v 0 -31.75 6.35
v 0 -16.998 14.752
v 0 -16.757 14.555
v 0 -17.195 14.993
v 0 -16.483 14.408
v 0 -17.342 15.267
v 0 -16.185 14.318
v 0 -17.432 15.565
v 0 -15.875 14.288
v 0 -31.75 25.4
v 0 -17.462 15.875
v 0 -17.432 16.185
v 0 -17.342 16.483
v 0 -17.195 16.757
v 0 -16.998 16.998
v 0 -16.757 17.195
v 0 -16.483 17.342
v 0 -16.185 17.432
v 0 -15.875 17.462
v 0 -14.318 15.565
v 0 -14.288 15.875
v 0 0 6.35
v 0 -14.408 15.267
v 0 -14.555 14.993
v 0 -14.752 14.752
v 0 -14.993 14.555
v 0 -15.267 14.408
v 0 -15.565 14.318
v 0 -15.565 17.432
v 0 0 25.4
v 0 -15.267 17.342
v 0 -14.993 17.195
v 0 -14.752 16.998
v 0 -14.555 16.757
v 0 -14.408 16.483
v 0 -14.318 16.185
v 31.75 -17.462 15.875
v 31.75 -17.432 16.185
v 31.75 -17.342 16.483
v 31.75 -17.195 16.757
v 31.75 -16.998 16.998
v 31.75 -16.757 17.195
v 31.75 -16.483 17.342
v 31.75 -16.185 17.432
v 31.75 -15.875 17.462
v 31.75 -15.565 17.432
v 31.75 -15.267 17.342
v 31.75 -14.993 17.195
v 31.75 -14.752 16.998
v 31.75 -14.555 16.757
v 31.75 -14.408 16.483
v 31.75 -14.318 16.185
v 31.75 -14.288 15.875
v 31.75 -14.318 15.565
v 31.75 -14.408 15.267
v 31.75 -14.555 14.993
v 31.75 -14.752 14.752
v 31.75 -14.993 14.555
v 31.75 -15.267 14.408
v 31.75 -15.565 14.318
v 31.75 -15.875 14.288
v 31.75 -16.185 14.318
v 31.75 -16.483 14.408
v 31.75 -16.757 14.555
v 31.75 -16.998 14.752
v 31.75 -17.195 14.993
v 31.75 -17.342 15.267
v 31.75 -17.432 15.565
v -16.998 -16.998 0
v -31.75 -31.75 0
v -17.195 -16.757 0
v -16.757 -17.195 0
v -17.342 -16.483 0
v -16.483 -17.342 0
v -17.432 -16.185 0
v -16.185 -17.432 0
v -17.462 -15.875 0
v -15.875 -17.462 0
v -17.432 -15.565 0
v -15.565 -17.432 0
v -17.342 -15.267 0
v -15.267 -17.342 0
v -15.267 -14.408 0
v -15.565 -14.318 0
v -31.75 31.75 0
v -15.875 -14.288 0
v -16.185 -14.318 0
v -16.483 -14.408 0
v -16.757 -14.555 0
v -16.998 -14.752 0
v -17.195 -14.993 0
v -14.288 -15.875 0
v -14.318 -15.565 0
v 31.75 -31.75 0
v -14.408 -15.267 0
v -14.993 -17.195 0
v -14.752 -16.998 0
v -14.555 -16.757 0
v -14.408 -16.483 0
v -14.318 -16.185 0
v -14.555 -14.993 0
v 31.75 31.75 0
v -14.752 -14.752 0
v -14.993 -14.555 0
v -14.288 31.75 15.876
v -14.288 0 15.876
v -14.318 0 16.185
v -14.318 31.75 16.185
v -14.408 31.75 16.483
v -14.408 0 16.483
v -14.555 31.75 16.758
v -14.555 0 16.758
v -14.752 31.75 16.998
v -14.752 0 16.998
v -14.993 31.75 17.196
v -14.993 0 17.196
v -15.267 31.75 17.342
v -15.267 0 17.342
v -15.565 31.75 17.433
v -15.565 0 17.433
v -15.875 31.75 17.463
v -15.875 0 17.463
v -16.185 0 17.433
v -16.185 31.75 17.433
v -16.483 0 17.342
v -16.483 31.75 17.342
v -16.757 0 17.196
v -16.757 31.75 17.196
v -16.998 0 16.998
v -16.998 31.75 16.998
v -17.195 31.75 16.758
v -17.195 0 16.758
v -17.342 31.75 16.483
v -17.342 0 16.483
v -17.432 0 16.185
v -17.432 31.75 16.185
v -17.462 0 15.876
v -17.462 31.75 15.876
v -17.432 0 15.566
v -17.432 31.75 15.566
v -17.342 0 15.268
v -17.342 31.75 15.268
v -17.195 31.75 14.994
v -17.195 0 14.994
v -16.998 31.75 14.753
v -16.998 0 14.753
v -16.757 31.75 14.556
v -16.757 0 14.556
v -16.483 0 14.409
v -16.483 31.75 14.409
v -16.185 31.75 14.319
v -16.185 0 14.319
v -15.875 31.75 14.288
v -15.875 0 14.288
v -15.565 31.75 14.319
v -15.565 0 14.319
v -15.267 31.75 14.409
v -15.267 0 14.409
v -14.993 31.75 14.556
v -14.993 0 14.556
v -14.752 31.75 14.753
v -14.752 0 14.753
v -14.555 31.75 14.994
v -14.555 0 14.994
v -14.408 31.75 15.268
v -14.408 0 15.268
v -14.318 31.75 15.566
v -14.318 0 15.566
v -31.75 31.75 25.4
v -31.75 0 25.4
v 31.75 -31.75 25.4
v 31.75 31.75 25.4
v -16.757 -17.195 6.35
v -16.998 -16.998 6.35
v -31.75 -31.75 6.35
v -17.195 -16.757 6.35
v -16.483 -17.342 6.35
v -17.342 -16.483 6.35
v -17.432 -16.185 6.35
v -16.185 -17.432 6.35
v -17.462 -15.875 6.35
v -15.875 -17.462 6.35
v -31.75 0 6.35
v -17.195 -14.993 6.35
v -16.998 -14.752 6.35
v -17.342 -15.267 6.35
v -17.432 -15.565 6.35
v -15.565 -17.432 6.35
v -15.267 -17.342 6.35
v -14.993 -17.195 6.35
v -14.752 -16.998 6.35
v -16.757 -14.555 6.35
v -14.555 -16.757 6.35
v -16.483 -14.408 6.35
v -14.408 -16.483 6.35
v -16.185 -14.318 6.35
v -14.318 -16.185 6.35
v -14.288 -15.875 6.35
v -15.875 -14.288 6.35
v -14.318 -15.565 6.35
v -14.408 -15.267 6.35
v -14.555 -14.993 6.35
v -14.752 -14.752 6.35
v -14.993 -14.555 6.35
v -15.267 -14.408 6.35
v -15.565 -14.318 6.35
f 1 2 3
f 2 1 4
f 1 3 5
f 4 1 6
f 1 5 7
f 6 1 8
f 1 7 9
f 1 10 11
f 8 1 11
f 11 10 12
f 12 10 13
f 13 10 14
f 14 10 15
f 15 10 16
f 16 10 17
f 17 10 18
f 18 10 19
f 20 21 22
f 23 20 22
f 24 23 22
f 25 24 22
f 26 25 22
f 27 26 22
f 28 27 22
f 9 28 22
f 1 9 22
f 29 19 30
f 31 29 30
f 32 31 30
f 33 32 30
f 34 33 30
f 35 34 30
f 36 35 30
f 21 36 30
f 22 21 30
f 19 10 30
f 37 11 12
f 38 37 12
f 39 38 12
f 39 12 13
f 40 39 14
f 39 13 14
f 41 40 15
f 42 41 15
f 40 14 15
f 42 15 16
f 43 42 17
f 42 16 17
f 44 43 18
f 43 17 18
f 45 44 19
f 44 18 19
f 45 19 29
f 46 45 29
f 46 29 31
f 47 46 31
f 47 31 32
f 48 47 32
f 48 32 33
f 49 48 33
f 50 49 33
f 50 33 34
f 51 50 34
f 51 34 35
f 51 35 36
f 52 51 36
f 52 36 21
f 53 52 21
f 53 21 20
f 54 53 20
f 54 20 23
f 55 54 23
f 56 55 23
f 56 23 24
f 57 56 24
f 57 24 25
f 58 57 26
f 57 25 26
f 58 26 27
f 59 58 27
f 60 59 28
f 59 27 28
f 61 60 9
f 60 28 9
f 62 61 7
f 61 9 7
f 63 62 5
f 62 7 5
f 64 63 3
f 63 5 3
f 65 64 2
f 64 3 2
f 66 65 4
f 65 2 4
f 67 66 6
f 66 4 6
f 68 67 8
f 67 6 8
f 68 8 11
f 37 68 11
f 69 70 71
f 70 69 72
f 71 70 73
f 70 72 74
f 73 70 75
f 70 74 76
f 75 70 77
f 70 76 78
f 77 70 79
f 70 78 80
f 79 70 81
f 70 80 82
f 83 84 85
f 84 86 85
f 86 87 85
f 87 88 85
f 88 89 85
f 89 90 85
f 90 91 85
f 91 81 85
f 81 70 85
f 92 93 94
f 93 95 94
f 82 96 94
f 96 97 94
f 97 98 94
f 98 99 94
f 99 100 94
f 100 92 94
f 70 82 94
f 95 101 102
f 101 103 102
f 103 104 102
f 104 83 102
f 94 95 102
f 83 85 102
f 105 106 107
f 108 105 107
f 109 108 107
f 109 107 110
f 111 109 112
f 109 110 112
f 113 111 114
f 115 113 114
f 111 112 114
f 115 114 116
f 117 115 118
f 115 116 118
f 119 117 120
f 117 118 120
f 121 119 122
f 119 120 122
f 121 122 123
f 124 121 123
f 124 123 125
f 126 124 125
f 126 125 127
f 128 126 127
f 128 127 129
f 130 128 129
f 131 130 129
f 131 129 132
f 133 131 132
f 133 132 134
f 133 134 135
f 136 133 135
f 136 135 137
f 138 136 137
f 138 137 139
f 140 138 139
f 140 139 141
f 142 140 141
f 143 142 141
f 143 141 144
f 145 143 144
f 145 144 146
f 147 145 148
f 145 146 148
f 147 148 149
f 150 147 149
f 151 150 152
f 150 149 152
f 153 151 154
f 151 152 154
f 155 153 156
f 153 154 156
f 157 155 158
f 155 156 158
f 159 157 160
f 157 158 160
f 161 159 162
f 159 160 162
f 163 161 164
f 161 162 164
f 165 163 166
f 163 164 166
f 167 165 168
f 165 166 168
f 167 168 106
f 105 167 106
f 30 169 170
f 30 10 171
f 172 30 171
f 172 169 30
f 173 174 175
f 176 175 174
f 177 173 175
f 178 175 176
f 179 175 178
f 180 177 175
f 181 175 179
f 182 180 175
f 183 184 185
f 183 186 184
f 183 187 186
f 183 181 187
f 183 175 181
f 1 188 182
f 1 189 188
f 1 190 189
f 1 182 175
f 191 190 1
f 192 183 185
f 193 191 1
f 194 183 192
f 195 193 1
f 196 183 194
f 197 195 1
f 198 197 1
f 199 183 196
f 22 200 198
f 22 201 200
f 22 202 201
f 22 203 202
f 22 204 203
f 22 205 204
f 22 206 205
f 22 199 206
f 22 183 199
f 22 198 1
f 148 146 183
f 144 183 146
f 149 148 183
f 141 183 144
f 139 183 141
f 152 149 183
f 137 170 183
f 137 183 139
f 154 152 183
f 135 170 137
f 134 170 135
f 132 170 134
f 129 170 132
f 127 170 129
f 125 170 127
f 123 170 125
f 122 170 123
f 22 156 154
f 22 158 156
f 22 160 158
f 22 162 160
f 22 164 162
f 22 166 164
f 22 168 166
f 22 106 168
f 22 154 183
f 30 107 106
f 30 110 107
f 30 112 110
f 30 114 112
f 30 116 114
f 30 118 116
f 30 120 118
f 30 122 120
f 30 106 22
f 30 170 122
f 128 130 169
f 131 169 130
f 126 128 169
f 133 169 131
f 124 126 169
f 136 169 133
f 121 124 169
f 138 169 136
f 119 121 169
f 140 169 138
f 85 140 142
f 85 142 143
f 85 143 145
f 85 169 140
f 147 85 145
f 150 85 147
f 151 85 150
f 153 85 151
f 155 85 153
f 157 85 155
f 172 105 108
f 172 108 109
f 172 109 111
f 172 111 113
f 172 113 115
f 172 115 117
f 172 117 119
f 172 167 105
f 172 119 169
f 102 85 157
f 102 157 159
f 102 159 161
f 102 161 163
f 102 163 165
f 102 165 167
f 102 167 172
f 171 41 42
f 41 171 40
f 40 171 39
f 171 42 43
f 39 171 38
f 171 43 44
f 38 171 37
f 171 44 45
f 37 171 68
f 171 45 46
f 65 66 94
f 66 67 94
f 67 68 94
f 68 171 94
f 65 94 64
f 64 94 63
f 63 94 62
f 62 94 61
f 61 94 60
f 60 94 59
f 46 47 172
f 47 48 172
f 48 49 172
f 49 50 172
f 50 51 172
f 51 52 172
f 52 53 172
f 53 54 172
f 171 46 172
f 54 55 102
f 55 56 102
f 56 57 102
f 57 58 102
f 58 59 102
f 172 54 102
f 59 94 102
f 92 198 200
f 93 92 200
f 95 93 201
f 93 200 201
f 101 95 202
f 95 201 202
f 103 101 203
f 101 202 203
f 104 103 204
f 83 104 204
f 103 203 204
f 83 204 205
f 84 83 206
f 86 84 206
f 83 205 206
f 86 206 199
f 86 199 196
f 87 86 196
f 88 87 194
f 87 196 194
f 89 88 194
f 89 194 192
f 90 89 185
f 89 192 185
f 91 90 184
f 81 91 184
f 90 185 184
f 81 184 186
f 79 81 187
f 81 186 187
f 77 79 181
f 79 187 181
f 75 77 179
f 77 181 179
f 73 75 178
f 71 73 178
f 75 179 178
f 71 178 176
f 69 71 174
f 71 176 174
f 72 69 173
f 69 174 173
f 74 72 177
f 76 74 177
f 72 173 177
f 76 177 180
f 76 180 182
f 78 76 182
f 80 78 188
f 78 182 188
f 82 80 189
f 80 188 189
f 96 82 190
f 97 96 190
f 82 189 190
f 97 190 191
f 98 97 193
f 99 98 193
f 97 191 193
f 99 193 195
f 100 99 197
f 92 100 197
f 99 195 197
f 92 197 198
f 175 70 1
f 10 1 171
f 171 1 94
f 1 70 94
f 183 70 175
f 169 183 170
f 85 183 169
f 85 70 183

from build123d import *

# Parameters (mm, degrees)
F0_W     = 63.5
F0_H     = 63.5
F1_DEPTH = 25.4
F2_W     = 31.75
F2_H     = 31.75
F3_DEPTH = 19.05
F4_R     = 1.5875
F5_DEPTH = 6.35
F6_R     = 1.5875
F7_DEPTH = 38.1
F8_R     = 1.5875
F9_DEPTH = 38.1


with BuildPart() as f1:
    # F0 (on Top) → F1 (new body)
    with BuildSketch(Plane.XY):
        Rectangle(F0_W, F0_H)
    extrude(amount=F1_DEPTH)

    # F2 (on face) → F3 (cut)
    with BuildSketch(Plane.XY.offset(25.4)):
        with Locations((-15.875, -15.875)):
            Rectangle(F2_W, F2_H)
    extrude(amount=-F3_DEPTH, mode=Mode.SUBTRACT)

    # F4 (on face) → F5 (cut)
    with BuildSketch(Plane.XY.offset(6.35)):
        with Locations((-15.875, -15.875)):
            Circle(F4_R)
    extrude(amount=-F5_DEPTH, mode=Mode.SUBTRACT)

    # F6 (on face) → F7 (cut)
    with BuildSketch(Plane(origin=(0, 0, 0), x_dir=(0, -1, 0), z_dir=(-1, 0, 0))):
        with Locations((15.875, 15.875)):
            Circle(F6_R)
    extrude(amount=-F7_DEPTH, mode=Mode.SUBTRACT)

    # F8 (on face) → F9 (cut)
    with BuildSketch(Plane.XZ):
        with Locations((-15.875, 15.875576)):
            Circle(F8_R)
    extrude(amount=-F9_DEPTH, mode=Mode.SUBTRACT)


solid = f1.part
